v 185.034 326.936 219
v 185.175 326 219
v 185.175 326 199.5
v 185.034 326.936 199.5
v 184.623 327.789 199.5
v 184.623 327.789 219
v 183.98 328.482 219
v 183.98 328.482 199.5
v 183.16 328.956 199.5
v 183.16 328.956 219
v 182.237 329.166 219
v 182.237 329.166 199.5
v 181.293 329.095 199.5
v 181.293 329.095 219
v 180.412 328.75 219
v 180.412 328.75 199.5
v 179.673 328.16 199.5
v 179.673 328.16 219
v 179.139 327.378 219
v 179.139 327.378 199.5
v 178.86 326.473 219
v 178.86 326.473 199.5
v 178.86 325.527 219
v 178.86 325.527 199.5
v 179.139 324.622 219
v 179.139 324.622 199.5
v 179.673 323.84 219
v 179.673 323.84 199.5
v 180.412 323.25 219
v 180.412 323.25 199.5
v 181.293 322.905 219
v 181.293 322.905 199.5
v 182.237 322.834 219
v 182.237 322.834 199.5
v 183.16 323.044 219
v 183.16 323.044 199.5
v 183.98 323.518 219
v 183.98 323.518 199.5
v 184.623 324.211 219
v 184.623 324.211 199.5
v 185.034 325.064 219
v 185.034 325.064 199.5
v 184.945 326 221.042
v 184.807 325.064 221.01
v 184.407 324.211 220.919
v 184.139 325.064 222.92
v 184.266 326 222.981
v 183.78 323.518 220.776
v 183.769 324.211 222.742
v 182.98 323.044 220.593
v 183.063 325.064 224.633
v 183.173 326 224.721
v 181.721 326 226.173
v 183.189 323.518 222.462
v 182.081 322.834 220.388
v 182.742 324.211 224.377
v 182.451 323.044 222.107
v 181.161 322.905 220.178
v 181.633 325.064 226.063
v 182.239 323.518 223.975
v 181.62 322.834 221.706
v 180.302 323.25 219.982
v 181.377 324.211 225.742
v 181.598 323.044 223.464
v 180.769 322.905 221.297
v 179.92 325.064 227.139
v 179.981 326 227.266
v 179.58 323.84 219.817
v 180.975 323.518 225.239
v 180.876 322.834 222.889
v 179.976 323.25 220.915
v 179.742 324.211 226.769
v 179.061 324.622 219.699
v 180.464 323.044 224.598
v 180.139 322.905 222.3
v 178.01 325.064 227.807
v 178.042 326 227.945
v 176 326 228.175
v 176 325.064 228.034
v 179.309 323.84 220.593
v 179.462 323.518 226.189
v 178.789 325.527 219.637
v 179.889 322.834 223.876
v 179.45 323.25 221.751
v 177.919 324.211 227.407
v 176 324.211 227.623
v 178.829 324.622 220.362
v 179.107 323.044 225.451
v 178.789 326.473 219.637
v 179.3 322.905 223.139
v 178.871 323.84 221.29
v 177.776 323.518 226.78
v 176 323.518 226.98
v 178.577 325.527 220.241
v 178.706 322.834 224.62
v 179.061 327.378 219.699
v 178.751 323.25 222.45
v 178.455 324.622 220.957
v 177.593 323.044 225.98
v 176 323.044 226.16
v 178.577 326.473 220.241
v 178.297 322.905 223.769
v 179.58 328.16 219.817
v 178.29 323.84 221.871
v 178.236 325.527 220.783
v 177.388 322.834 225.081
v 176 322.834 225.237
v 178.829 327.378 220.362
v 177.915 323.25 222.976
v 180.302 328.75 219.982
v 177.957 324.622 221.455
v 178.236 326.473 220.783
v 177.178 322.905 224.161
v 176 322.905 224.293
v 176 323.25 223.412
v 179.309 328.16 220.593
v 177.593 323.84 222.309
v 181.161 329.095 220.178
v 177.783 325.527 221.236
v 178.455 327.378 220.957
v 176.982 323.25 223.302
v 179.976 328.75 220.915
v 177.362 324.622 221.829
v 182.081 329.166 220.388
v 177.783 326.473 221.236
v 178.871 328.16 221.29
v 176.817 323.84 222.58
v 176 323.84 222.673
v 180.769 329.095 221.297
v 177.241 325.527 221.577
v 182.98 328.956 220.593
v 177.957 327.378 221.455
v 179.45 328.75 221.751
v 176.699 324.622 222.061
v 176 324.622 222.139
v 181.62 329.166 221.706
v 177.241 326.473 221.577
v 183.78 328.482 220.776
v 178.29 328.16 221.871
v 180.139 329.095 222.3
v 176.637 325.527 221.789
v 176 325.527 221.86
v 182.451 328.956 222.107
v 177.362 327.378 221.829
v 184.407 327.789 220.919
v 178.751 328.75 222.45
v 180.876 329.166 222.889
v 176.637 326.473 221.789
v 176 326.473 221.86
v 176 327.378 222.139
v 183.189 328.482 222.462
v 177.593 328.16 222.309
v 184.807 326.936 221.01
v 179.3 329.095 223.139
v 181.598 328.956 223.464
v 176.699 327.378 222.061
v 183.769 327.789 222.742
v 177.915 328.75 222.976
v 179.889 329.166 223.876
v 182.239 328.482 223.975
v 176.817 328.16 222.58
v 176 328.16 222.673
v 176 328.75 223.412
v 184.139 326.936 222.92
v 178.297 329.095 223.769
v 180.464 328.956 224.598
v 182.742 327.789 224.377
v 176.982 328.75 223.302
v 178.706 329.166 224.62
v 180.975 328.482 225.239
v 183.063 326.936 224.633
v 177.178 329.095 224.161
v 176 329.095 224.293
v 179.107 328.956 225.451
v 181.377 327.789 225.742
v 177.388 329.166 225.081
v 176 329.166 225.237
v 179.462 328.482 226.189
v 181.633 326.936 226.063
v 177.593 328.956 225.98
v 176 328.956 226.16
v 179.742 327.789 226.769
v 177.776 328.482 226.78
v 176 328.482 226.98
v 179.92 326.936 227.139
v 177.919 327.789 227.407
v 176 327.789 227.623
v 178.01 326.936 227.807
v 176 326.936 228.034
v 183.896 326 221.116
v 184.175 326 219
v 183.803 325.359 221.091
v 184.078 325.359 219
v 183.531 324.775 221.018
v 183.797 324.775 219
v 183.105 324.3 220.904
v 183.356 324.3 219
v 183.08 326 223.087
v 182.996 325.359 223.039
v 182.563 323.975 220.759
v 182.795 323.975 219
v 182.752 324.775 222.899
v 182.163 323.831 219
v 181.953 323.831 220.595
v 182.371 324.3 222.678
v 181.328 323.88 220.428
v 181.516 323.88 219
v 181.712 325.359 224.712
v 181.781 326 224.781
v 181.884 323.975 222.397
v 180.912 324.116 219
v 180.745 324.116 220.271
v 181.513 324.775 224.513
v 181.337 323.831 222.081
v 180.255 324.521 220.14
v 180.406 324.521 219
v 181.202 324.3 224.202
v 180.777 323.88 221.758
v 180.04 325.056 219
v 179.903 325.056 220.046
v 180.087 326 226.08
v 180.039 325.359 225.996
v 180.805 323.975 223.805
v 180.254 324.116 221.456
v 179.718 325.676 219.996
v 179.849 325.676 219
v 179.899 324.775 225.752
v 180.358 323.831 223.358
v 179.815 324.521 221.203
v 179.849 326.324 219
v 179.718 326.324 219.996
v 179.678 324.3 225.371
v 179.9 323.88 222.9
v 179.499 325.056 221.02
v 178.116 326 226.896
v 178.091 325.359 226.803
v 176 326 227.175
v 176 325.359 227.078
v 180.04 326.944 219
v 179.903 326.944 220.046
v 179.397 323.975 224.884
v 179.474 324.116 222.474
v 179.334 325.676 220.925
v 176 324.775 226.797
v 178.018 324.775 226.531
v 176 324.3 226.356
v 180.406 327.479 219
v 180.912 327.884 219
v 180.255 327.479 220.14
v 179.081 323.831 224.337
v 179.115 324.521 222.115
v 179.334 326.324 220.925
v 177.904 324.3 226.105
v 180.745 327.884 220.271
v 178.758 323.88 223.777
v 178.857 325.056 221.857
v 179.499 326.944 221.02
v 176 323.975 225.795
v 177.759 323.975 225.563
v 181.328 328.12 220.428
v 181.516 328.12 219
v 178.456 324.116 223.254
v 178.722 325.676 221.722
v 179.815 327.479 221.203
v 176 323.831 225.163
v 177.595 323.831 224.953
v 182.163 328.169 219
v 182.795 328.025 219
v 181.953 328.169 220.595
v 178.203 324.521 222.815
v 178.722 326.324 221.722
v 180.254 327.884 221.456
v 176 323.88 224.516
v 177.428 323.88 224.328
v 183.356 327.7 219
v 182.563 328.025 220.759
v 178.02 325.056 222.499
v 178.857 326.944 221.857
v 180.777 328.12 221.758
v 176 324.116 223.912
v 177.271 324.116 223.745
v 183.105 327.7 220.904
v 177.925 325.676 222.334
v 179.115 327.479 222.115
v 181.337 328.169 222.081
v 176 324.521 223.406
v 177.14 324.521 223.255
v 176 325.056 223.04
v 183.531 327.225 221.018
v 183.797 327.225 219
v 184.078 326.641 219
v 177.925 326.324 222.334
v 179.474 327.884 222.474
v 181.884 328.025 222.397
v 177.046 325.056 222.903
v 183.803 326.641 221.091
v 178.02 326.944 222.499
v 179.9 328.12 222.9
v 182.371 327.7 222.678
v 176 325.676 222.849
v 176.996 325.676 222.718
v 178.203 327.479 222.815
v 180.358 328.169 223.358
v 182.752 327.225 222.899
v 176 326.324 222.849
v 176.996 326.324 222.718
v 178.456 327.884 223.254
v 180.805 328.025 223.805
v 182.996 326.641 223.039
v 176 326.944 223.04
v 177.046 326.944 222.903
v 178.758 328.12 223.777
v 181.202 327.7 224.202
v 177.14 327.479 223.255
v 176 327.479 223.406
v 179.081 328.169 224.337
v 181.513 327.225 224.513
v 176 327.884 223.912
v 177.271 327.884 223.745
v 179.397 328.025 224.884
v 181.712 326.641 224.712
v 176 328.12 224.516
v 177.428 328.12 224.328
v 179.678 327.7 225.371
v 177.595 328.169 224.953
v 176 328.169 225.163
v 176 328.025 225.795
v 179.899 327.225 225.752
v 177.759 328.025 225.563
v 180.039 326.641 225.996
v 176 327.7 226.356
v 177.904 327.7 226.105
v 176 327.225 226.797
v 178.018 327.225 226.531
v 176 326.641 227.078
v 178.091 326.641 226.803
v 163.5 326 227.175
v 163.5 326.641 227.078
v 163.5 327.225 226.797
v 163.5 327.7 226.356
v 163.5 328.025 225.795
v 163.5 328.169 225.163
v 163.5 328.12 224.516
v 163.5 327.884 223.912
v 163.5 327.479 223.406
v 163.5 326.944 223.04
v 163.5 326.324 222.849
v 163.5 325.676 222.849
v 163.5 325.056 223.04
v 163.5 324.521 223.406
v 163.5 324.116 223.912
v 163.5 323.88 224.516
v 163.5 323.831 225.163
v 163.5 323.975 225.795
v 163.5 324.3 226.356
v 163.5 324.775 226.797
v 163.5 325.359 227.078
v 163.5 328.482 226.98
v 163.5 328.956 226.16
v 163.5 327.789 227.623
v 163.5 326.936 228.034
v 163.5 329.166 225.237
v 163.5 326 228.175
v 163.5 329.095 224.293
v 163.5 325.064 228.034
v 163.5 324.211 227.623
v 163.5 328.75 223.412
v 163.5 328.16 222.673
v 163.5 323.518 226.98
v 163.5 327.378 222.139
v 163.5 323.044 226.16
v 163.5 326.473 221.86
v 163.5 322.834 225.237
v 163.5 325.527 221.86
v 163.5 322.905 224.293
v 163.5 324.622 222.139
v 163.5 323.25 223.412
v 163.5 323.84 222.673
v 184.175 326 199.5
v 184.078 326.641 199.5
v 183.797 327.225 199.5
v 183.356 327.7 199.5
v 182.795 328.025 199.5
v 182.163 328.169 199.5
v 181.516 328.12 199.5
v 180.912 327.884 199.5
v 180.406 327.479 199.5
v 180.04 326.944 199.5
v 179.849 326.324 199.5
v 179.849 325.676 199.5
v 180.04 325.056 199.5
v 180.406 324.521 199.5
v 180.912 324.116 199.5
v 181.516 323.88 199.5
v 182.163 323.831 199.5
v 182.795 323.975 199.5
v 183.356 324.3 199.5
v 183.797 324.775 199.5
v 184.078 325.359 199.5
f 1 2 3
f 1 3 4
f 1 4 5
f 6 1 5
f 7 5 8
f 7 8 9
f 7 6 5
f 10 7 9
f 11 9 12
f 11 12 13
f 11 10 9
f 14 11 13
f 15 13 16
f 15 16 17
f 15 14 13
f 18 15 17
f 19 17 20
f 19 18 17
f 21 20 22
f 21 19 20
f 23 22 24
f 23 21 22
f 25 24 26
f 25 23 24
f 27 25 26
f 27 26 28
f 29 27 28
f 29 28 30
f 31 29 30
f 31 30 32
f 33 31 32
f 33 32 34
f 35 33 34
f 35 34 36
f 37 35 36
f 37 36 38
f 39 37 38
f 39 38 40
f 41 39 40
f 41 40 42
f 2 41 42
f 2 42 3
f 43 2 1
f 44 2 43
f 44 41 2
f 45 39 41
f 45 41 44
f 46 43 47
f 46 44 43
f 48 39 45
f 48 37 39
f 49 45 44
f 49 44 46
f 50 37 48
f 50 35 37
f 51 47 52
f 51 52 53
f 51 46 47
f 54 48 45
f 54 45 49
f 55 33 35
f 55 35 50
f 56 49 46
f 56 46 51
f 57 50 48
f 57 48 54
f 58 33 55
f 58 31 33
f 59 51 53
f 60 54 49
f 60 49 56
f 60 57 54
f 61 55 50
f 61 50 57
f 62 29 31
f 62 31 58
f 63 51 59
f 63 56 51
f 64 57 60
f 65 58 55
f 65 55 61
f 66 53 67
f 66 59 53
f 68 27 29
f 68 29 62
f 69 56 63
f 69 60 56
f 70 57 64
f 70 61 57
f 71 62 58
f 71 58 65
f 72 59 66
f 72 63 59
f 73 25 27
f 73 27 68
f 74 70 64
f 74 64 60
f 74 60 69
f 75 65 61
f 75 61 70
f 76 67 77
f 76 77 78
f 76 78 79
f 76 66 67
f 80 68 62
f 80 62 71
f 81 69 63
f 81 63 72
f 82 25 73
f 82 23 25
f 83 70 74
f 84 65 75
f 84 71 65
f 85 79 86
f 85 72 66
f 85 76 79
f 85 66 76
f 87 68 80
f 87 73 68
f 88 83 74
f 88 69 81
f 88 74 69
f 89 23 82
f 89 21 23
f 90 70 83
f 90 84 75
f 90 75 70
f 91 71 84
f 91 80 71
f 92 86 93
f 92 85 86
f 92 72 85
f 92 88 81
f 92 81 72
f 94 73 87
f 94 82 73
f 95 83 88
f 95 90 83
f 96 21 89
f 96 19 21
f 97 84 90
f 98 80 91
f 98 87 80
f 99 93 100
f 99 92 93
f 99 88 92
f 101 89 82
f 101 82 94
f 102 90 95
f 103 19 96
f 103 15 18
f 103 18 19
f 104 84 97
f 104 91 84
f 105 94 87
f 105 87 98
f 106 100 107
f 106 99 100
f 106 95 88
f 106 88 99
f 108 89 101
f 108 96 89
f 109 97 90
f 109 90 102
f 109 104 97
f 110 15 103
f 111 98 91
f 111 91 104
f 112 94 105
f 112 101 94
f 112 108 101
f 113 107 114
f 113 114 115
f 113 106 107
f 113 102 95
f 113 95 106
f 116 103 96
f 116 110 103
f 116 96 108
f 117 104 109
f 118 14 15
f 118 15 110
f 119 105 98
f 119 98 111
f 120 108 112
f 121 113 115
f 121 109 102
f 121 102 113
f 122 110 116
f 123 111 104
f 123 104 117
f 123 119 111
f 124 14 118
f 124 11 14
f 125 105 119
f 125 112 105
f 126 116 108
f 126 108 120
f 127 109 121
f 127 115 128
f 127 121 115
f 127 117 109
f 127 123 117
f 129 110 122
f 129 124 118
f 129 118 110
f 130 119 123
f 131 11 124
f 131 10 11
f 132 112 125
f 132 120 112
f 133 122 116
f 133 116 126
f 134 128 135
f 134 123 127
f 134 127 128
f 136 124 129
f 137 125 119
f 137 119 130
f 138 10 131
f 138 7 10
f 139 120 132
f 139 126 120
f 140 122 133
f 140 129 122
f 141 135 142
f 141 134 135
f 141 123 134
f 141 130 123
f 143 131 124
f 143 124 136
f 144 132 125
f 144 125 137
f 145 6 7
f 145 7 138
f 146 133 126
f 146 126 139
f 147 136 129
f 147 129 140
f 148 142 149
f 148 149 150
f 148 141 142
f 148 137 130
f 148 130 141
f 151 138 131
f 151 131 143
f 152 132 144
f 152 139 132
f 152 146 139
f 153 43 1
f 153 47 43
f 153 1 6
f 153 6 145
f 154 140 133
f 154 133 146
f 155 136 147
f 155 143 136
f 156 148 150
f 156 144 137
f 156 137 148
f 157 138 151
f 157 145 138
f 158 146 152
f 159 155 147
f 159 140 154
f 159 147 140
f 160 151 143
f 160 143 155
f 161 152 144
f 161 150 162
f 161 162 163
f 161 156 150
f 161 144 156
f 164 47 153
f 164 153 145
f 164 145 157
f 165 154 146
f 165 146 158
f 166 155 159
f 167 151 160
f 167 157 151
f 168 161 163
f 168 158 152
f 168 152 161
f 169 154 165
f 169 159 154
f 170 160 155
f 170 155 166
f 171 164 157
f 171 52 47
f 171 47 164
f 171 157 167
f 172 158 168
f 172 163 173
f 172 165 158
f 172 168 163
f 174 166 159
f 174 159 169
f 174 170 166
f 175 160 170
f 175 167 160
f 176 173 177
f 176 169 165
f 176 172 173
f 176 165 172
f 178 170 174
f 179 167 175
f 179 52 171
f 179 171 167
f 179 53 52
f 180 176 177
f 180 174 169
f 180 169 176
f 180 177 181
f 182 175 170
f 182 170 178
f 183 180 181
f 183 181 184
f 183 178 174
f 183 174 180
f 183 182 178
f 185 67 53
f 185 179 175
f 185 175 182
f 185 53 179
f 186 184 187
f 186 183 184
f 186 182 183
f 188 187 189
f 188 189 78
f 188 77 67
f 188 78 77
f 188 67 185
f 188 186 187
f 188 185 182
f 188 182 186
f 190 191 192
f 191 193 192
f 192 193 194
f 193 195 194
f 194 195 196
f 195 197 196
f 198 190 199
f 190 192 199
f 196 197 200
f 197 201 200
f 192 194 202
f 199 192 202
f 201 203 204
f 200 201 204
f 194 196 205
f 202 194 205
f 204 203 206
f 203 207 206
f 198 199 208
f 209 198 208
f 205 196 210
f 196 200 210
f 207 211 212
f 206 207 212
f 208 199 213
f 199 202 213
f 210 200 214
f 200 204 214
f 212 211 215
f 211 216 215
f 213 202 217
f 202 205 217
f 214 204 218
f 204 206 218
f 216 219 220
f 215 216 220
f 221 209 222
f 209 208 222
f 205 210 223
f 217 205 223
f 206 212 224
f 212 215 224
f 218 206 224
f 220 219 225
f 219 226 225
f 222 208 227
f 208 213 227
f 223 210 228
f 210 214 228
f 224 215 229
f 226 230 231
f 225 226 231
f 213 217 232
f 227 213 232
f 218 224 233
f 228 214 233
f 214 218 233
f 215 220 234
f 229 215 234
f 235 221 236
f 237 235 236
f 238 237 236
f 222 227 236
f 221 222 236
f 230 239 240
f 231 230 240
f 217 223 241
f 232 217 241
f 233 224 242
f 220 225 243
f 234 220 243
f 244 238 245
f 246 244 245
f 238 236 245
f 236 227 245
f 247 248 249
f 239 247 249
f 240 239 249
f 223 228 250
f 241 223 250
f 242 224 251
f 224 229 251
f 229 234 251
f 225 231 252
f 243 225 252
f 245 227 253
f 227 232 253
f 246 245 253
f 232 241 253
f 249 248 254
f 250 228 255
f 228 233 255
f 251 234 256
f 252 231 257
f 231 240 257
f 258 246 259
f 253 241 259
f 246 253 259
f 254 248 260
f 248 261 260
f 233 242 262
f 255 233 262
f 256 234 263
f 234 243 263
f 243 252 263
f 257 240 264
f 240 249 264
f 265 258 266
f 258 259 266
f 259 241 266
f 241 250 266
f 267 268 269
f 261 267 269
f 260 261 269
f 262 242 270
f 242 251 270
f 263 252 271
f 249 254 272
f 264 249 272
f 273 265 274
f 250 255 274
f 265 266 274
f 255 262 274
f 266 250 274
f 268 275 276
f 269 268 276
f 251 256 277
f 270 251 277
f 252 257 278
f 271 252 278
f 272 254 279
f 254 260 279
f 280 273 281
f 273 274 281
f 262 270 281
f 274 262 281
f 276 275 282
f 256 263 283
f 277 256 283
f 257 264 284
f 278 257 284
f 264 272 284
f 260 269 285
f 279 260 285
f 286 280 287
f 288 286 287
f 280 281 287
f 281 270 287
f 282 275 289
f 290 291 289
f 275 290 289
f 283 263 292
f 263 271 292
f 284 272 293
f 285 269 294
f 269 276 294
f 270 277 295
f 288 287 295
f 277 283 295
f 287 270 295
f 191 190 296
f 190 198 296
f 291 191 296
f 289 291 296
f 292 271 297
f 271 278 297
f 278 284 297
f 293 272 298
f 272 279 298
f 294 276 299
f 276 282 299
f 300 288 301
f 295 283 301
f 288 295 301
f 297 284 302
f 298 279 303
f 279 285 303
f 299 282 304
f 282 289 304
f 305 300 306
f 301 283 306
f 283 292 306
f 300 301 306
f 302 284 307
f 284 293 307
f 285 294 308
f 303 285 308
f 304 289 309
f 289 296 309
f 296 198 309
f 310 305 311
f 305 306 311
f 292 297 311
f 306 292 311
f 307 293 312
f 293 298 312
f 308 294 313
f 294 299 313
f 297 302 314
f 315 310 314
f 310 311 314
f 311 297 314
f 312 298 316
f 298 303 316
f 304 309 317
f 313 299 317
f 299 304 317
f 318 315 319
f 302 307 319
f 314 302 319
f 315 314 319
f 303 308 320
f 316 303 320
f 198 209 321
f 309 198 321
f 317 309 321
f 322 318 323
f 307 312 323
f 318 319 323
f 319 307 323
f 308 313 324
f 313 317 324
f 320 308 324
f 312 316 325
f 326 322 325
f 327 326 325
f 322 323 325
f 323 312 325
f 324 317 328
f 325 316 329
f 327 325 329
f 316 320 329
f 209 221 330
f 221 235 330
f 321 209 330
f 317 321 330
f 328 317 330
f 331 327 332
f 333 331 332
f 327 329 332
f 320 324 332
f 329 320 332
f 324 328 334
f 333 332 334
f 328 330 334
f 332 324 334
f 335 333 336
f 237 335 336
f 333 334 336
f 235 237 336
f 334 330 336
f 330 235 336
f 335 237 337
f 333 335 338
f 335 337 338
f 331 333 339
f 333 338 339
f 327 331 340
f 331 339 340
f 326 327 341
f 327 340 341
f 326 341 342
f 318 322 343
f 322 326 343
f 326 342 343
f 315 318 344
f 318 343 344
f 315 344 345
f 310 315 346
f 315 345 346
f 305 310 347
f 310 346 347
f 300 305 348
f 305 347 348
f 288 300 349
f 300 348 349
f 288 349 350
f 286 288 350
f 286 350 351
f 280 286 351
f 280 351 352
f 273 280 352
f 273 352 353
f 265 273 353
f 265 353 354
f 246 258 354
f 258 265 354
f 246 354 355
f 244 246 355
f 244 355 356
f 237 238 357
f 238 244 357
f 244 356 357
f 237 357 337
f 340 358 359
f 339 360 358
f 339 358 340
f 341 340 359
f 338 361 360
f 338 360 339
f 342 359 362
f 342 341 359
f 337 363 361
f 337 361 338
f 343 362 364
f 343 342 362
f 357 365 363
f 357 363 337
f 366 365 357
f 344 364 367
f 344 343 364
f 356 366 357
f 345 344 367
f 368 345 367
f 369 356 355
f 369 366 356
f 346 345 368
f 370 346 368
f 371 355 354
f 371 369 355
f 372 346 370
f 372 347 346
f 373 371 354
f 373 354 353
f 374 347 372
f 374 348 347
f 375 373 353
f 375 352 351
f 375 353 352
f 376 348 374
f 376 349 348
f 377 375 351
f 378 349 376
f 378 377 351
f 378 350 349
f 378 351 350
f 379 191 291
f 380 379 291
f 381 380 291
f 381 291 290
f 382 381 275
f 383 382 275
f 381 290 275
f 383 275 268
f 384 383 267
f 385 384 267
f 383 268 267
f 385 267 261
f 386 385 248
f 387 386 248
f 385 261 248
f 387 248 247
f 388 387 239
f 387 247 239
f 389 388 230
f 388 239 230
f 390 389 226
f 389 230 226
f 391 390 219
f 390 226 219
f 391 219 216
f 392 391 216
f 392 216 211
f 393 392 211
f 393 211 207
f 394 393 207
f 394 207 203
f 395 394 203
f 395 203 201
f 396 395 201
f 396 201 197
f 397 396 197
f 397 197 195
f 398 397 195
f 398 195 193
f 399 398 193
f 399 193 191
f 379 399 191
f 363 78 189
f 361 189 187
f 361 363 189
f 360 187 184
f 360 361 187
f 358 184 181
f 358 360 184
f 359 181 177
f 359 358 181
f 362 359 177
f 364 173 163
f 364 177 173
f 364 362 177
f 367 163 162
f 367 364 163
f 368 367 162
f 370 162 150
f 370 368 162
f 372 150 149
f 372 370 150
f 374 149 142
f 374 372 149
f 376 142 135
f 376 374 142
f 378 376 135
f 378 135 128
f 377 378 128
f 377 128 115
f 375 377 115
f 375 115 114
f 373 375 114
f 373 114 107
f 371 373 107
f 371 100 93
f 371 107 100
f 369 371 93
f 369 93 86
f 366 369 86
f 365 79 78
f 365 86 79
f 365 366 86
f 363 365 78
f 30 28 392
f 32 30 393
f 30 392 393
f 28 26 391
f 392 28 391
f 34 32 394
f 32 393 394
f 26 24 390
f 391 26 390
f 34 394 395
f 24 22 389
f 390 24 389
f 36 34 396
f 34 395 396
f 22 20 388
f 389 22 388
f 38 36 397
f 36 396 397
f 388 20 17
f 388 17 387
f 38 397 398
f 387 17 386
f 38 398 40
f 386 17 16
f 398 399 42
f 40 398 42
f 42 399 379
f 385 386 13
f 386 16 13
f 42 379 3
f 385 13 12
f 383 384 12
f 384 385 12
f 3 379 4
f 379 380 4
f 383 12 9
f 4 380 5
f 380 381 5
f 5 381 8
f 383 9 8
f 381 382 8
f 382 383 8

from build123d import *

# Parameters (mm, degrees)
TUBE_PROFILE_R   = 3.175
TUBE_PROFILE_R_2 = 2.175


with BuildPart() as part:
    # Tube: sweep along a curve in space
    with BuildLine() as tube_path:
        Line((182, 326, 199.5), (182, 326, 219))
        ThreePointArc((176, 326, 225), (180.242640687, 326, 223.242640687), (182, 326, 219))
        Line((176, 326, 225), (163.5, 326, 225))
    # Tube profile (on start of the path) → Tube (sweep)
    with BuildSketch(Plane(origin=(182, 326, 199.5), x_dir=(1, 0, 0), z_dir=(0, 0, 1))):
        Circle(TUBE_PROFILE_R)
        Circle(TUBE_PROFILE_R_2, mode=Mode.SUBTRACT)
    sweep(path=tube_path.line)


solid = part.part
